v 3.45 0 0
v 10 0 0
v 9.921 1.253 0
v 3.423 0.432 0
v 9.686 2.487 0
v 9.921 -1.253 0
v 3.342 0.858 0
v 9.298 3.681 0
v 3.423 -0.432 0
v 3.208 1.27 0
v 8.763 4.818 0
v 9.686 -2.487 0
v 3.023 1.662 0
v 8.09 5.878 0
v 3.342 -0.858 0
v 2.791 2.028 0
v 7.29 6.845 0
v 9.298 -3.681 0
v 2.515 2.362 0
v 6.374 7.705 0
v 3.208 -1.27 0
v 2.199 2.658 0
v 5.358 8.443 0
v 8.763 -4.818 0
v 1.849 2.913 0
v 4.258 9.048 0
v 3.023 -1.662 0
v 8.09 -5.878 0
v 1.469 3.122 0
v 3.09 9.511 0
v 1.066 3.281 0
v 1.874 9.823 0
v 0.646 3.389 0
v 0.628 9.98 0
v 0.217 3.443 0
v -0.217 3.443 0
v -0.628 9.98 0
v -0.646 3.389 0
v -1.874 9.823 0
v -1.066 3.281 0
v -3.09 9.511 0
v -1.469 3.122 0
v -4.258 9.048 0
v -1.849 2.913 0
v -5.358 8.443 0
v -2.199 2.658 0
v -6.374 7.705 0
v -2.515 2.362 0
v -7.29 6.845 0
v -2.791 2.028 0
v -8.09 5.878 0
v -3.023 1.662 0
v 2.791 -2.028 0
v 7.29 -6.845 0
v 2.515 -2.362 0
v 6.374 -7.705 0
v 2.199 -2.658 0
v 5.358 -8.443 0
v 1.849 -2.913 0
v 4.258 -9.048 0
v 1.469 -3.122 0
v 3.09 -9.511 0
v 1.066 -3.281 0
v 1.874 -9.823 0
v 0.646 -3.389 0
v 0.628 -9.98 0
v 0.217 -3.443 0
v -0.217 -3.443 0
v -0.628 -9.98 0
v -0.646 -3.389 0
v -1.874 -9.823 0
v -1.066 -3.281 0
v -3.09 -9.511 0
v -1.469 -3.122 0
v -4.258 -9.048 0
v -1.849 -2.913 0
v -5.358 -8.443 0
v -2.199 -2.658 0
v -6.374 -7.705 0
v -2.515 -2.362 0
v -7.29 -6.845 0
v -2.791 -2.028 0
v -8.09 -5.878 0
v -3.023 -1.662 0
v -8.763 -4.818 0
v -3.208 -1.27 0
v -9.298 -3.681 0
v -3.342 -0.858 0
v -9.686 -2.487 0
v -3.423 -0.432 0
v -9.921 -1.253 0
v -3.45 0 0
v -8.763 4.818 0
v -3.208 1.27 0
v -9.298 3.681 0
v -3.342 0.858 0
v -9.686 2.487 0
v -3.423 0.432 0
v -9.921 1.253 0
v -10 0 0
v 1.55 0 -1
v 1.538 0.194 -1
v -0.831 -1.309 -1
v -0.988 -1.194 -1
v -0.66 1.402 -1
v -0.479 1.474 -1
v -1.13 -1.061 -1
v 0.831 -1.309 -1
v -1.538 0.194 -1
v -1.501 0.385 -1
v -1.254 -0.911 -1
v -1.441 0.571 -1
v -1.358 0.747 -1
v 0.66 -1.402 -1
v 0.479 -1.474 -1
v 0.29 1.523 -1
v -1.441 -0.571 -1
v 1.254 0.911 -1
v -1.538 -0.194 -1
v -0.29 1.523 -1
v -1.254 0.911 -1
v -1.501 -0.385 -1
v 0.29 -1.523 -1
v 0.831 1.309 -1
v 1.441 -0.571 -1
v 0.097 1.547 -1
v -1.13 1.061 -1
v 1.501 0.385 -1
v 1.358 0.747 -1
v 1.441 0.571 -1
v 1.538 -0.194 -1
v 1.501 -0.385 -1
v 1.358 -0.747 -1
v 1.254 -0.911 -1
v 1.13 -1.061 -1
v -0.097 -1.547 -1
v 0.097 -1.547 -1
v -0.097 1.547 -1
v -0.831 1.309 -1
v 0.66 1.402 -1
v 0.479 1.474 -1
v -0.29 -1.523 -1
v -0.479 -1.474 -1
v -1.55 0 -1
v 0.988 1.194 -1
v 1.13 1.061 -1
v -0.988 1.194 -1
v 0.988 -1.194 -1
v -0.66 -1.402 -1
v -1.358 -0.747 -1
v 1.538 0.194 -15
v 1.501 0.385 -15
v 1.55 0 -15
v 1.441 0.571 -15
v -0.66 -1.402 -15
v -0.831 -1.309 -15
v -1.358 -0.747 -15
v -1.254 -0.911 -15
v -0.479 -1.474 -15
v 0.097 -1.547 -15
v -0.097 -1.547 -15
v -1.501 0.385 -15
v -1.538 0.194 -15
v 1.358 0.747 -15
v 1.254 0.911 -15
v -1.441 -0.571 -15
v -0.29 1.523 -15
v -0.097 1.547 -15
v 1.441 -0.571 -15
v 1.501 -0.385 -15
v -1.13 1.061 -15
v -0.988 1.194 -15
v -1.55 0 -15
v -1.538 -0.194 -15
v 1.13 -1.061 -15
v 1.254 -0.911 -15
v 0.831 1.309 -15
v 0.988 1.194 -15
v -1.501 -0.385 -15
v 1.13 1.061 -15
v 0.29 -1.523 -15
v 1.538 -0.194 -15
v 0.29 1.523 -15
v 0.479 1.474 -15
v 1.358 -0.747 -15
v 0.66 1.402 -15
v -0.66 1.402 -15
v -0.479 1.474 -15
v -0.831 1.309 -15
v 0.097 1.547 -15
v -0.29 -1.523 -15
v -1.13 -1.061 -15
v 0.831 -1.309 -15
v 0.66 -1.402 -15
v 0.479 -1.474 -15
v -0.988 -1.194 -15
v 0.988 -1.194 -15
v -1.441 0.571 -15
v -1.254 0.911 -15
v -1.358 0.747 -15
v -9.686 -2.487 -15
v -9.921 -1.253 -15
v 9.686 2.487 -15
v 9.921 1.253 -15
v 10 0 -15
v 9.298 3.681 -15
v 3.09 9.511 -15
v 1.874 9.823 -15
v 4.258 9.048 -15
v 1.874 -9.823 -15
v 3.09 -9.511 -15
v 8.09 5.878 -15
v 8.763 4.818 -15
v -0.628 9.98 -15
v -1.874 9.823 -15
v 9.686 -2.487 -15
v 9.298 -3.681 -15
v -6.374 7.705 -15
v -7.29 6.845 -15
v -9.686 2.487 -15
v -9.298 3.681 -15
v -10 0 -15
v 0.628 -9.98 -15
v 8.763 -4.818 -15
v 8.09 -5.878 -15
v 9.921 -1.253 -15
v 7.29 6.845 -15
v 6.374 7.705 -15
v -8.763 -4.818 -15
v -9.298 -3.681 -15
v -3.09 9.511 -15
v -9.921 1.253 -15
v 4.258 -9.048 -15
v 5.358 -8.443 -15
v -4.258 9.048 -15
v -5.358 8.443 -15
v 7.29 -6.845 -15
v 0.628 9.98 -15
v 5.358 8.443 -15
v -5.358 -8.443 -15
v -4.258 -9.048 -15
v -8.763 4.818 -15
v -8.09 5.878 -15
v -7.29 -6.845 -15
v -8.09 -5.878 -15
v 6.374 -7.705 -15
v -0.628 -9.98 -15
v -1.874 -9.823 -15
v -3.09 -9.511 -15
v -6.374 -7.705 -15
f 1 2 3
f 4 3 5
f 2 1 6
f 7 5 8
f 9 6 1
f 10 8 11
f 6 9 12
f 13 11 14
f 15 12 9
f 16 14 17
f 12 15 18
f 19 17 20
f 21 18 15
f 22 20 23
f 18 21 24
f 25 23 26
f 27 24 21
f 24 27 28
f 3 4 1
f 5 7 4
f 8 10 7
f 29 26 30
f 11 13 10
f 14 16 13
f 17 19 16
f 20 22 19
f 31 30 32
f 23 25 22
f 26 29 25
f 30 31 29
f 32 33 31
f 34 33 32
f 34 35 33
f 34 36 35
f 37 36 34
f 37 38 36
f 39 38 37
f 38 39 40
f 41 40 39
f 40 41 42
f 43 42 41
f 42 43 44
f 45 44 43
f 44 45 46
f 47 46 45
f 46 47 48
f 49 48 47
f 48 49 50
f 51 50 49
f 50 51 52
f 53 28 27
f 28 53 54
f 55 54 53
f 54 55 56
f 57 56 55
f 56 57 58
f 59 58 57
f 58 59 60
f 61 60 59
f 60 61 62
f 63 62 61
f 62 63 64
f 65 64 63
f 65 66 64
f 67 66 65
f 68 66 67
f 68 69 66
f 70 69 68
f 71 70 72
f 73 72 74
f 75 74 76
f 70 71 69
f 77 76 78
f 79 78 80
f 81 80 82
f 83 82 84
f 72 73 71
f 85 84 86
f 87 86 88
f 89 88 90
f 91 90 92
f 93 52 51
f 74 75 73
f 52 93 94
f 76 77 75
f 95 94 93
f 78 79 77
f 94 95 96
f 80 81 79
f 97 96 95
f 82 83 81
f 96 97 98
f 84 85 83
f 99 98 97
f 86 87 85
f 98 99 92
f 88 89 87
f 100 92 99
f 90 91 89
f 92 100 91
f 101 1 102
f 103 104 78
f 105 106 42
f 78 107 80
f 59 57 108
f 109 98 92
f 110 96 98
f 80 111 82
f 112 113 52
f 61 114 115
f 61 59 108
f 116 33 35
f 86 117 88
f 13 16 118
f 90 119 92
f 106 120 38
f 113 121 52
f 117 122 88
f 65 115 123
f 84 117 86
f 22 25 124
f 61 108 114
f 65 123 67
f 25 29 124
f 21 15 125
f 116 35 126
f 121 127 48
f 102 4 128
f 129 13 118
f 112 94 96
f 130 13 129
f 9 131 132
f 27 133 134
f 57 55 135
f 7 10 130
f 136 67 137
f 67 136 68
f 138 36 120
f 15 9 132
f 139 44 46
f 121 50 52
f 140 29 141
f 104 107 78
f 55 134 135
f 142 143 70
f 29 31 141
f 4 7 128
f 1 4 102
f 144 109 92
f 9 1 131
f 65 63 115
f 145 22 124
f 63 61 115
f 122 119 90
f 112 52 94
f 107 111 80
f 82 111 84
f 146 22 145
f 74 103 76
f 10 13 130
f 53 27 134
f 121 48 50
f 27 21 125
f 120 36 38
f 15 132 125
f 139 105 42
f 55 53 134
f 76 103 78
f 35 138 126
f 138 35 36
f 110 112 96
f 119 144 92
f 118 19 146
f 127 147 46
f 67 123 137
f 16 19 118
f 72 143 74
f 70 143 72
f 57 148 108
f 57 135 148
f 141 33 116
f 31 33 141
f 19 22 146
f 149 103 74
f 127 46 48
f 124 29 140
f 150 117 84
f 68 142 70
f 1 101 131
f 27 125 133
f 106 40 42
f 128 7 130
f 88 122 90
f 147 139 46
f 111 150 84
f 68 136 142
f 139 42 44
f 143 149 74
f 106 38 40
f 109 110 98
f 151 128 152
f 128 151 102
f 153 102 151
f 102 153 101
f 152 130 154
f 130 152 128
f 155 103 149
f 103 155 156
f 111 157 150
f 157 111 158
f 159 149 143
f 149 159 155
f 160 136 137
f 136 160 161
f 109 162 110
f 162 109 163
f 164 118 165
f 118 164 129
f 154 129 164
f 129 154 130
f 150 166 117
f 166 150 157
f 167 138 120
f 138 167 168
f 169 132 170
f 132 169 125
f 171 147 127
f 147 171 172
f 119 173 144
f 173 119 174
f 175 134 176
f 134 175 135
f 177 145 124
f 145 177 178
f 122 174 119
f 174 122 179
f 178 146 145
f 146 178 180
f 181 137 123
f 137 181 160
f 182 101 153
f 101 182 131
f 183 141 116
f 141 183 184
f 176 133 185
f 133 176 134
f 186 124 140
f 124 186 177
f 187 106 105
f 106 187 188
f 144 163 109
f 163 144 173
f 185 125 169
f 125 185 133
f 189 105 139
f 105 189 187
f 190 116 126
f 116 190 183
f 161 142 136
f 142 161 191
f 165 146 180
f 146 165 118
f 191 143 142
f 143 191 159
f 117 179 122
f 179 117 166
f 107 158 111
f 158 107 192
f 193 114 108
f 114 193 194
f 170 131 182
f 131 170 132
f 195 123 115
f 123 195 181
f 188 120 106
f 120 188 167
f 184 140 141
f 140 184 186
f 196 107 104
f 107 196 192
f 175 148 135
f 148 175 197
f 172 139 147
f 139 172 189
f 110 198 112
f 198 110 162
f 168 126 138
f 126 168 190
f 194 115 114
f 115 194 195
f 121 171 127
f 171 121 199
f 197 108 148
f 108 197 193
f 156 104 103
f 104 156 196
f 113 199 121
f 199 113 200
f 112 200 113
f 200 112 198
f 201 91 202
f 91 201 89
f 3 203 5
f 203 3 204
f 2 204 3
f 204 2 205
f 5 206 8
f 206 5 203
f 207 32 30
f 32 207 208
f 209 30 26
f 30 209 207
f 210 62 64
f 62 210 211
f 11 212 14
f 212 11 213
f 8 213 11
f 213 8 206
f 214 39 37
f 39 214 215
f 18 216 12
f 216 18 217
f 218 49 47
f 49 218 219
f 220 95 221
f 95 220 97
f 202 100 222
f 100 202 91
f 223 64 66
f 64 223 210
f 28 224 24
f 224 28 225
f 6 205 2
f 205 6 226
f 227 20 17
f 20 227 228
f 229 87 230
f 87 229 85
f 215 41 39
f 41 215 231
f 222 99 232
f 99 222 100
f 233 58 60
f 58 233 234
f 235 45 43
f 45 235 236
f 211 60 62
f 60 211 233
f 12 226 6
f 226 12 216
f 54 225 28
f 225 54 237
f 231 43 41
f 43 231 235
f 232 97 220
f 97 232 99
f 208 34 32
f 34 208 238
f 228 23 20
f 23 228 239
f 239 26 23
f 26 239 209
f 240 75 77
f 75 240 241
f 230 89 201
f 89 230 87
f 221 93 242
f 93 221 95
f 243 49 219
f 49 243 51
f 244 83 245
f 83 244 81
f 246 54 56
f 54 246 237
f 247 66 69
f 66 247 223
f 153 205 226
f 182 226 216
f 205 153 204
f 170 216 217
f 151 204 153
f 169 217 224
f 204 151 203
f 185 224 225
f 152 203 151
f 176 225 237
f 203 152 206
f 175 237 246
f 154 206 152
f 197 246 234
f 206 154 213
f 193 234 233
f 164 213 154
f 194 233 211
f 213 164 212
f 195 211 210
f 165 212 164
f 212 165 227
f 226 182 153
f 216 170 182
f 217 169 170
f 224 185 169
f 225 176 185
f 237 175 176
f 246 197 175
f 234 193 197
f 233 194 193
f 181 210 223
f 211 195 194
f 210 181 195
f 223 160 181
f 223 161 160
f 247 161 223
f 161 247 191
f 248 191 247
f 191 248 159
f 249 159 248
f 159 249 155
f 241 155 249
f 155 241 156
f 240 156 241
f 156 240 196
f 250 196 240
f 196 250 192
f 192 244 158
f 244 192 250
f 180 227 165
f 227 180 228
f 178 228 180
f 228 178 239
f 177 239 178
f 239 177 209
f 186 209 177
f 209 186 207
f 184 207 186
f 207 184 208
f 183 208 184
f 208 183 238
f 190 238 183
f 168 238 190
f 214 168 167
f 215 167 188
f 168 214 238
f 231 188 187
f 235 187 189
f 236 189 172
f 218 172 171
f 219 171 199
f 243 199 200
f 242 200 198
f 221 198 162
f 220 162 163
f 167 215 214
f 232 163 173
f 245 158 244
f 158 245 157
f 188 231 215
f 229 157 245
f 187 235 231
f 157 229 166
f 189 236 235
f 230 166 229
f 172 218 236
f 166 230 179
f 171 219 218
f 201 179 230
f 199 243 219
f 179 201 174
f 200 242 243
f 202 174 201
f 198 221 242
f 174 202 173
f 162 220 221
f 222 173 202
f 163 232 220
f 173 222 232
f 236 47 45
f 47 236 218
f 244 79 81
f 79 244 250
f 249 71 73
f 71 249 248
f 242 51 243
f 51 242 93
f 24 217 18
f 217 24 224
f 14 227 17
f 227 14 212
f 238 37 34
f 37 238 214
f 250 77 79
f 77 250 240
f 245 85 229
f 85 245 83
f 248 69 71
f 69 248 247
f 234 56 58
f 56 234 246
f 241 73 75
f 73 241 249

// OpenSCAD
$fn = 50;

difference() {
	union() {
		translate(v = [0, 0, -15.0]) {
			cylinder(h = 15, r = 10.0);
		}
	}
	union() {
		translate(v = [0, 0, 0]) {
			rotate(a = [0, 0, 0]) {
				difference() {
					union() {
						translate(v = [0, 0, -18.0]) {
							cylinder(h = 18, r = 1.25);
						}
						translate(v = [0, 0, -1.0]) {
							cylinder(h = 1.0, r1 = 1.55, r2 = 3.45);
						}
						translate(v = [0, 0, -18.0]) {
							cylinder(h = 18, r = 1.55);
						}
						translate(v = [0, 0, -18.0]) {
							cylinder(h = 18, r = 1.25);
						}
					}
					union();
				}
			}
		}
	}
}
